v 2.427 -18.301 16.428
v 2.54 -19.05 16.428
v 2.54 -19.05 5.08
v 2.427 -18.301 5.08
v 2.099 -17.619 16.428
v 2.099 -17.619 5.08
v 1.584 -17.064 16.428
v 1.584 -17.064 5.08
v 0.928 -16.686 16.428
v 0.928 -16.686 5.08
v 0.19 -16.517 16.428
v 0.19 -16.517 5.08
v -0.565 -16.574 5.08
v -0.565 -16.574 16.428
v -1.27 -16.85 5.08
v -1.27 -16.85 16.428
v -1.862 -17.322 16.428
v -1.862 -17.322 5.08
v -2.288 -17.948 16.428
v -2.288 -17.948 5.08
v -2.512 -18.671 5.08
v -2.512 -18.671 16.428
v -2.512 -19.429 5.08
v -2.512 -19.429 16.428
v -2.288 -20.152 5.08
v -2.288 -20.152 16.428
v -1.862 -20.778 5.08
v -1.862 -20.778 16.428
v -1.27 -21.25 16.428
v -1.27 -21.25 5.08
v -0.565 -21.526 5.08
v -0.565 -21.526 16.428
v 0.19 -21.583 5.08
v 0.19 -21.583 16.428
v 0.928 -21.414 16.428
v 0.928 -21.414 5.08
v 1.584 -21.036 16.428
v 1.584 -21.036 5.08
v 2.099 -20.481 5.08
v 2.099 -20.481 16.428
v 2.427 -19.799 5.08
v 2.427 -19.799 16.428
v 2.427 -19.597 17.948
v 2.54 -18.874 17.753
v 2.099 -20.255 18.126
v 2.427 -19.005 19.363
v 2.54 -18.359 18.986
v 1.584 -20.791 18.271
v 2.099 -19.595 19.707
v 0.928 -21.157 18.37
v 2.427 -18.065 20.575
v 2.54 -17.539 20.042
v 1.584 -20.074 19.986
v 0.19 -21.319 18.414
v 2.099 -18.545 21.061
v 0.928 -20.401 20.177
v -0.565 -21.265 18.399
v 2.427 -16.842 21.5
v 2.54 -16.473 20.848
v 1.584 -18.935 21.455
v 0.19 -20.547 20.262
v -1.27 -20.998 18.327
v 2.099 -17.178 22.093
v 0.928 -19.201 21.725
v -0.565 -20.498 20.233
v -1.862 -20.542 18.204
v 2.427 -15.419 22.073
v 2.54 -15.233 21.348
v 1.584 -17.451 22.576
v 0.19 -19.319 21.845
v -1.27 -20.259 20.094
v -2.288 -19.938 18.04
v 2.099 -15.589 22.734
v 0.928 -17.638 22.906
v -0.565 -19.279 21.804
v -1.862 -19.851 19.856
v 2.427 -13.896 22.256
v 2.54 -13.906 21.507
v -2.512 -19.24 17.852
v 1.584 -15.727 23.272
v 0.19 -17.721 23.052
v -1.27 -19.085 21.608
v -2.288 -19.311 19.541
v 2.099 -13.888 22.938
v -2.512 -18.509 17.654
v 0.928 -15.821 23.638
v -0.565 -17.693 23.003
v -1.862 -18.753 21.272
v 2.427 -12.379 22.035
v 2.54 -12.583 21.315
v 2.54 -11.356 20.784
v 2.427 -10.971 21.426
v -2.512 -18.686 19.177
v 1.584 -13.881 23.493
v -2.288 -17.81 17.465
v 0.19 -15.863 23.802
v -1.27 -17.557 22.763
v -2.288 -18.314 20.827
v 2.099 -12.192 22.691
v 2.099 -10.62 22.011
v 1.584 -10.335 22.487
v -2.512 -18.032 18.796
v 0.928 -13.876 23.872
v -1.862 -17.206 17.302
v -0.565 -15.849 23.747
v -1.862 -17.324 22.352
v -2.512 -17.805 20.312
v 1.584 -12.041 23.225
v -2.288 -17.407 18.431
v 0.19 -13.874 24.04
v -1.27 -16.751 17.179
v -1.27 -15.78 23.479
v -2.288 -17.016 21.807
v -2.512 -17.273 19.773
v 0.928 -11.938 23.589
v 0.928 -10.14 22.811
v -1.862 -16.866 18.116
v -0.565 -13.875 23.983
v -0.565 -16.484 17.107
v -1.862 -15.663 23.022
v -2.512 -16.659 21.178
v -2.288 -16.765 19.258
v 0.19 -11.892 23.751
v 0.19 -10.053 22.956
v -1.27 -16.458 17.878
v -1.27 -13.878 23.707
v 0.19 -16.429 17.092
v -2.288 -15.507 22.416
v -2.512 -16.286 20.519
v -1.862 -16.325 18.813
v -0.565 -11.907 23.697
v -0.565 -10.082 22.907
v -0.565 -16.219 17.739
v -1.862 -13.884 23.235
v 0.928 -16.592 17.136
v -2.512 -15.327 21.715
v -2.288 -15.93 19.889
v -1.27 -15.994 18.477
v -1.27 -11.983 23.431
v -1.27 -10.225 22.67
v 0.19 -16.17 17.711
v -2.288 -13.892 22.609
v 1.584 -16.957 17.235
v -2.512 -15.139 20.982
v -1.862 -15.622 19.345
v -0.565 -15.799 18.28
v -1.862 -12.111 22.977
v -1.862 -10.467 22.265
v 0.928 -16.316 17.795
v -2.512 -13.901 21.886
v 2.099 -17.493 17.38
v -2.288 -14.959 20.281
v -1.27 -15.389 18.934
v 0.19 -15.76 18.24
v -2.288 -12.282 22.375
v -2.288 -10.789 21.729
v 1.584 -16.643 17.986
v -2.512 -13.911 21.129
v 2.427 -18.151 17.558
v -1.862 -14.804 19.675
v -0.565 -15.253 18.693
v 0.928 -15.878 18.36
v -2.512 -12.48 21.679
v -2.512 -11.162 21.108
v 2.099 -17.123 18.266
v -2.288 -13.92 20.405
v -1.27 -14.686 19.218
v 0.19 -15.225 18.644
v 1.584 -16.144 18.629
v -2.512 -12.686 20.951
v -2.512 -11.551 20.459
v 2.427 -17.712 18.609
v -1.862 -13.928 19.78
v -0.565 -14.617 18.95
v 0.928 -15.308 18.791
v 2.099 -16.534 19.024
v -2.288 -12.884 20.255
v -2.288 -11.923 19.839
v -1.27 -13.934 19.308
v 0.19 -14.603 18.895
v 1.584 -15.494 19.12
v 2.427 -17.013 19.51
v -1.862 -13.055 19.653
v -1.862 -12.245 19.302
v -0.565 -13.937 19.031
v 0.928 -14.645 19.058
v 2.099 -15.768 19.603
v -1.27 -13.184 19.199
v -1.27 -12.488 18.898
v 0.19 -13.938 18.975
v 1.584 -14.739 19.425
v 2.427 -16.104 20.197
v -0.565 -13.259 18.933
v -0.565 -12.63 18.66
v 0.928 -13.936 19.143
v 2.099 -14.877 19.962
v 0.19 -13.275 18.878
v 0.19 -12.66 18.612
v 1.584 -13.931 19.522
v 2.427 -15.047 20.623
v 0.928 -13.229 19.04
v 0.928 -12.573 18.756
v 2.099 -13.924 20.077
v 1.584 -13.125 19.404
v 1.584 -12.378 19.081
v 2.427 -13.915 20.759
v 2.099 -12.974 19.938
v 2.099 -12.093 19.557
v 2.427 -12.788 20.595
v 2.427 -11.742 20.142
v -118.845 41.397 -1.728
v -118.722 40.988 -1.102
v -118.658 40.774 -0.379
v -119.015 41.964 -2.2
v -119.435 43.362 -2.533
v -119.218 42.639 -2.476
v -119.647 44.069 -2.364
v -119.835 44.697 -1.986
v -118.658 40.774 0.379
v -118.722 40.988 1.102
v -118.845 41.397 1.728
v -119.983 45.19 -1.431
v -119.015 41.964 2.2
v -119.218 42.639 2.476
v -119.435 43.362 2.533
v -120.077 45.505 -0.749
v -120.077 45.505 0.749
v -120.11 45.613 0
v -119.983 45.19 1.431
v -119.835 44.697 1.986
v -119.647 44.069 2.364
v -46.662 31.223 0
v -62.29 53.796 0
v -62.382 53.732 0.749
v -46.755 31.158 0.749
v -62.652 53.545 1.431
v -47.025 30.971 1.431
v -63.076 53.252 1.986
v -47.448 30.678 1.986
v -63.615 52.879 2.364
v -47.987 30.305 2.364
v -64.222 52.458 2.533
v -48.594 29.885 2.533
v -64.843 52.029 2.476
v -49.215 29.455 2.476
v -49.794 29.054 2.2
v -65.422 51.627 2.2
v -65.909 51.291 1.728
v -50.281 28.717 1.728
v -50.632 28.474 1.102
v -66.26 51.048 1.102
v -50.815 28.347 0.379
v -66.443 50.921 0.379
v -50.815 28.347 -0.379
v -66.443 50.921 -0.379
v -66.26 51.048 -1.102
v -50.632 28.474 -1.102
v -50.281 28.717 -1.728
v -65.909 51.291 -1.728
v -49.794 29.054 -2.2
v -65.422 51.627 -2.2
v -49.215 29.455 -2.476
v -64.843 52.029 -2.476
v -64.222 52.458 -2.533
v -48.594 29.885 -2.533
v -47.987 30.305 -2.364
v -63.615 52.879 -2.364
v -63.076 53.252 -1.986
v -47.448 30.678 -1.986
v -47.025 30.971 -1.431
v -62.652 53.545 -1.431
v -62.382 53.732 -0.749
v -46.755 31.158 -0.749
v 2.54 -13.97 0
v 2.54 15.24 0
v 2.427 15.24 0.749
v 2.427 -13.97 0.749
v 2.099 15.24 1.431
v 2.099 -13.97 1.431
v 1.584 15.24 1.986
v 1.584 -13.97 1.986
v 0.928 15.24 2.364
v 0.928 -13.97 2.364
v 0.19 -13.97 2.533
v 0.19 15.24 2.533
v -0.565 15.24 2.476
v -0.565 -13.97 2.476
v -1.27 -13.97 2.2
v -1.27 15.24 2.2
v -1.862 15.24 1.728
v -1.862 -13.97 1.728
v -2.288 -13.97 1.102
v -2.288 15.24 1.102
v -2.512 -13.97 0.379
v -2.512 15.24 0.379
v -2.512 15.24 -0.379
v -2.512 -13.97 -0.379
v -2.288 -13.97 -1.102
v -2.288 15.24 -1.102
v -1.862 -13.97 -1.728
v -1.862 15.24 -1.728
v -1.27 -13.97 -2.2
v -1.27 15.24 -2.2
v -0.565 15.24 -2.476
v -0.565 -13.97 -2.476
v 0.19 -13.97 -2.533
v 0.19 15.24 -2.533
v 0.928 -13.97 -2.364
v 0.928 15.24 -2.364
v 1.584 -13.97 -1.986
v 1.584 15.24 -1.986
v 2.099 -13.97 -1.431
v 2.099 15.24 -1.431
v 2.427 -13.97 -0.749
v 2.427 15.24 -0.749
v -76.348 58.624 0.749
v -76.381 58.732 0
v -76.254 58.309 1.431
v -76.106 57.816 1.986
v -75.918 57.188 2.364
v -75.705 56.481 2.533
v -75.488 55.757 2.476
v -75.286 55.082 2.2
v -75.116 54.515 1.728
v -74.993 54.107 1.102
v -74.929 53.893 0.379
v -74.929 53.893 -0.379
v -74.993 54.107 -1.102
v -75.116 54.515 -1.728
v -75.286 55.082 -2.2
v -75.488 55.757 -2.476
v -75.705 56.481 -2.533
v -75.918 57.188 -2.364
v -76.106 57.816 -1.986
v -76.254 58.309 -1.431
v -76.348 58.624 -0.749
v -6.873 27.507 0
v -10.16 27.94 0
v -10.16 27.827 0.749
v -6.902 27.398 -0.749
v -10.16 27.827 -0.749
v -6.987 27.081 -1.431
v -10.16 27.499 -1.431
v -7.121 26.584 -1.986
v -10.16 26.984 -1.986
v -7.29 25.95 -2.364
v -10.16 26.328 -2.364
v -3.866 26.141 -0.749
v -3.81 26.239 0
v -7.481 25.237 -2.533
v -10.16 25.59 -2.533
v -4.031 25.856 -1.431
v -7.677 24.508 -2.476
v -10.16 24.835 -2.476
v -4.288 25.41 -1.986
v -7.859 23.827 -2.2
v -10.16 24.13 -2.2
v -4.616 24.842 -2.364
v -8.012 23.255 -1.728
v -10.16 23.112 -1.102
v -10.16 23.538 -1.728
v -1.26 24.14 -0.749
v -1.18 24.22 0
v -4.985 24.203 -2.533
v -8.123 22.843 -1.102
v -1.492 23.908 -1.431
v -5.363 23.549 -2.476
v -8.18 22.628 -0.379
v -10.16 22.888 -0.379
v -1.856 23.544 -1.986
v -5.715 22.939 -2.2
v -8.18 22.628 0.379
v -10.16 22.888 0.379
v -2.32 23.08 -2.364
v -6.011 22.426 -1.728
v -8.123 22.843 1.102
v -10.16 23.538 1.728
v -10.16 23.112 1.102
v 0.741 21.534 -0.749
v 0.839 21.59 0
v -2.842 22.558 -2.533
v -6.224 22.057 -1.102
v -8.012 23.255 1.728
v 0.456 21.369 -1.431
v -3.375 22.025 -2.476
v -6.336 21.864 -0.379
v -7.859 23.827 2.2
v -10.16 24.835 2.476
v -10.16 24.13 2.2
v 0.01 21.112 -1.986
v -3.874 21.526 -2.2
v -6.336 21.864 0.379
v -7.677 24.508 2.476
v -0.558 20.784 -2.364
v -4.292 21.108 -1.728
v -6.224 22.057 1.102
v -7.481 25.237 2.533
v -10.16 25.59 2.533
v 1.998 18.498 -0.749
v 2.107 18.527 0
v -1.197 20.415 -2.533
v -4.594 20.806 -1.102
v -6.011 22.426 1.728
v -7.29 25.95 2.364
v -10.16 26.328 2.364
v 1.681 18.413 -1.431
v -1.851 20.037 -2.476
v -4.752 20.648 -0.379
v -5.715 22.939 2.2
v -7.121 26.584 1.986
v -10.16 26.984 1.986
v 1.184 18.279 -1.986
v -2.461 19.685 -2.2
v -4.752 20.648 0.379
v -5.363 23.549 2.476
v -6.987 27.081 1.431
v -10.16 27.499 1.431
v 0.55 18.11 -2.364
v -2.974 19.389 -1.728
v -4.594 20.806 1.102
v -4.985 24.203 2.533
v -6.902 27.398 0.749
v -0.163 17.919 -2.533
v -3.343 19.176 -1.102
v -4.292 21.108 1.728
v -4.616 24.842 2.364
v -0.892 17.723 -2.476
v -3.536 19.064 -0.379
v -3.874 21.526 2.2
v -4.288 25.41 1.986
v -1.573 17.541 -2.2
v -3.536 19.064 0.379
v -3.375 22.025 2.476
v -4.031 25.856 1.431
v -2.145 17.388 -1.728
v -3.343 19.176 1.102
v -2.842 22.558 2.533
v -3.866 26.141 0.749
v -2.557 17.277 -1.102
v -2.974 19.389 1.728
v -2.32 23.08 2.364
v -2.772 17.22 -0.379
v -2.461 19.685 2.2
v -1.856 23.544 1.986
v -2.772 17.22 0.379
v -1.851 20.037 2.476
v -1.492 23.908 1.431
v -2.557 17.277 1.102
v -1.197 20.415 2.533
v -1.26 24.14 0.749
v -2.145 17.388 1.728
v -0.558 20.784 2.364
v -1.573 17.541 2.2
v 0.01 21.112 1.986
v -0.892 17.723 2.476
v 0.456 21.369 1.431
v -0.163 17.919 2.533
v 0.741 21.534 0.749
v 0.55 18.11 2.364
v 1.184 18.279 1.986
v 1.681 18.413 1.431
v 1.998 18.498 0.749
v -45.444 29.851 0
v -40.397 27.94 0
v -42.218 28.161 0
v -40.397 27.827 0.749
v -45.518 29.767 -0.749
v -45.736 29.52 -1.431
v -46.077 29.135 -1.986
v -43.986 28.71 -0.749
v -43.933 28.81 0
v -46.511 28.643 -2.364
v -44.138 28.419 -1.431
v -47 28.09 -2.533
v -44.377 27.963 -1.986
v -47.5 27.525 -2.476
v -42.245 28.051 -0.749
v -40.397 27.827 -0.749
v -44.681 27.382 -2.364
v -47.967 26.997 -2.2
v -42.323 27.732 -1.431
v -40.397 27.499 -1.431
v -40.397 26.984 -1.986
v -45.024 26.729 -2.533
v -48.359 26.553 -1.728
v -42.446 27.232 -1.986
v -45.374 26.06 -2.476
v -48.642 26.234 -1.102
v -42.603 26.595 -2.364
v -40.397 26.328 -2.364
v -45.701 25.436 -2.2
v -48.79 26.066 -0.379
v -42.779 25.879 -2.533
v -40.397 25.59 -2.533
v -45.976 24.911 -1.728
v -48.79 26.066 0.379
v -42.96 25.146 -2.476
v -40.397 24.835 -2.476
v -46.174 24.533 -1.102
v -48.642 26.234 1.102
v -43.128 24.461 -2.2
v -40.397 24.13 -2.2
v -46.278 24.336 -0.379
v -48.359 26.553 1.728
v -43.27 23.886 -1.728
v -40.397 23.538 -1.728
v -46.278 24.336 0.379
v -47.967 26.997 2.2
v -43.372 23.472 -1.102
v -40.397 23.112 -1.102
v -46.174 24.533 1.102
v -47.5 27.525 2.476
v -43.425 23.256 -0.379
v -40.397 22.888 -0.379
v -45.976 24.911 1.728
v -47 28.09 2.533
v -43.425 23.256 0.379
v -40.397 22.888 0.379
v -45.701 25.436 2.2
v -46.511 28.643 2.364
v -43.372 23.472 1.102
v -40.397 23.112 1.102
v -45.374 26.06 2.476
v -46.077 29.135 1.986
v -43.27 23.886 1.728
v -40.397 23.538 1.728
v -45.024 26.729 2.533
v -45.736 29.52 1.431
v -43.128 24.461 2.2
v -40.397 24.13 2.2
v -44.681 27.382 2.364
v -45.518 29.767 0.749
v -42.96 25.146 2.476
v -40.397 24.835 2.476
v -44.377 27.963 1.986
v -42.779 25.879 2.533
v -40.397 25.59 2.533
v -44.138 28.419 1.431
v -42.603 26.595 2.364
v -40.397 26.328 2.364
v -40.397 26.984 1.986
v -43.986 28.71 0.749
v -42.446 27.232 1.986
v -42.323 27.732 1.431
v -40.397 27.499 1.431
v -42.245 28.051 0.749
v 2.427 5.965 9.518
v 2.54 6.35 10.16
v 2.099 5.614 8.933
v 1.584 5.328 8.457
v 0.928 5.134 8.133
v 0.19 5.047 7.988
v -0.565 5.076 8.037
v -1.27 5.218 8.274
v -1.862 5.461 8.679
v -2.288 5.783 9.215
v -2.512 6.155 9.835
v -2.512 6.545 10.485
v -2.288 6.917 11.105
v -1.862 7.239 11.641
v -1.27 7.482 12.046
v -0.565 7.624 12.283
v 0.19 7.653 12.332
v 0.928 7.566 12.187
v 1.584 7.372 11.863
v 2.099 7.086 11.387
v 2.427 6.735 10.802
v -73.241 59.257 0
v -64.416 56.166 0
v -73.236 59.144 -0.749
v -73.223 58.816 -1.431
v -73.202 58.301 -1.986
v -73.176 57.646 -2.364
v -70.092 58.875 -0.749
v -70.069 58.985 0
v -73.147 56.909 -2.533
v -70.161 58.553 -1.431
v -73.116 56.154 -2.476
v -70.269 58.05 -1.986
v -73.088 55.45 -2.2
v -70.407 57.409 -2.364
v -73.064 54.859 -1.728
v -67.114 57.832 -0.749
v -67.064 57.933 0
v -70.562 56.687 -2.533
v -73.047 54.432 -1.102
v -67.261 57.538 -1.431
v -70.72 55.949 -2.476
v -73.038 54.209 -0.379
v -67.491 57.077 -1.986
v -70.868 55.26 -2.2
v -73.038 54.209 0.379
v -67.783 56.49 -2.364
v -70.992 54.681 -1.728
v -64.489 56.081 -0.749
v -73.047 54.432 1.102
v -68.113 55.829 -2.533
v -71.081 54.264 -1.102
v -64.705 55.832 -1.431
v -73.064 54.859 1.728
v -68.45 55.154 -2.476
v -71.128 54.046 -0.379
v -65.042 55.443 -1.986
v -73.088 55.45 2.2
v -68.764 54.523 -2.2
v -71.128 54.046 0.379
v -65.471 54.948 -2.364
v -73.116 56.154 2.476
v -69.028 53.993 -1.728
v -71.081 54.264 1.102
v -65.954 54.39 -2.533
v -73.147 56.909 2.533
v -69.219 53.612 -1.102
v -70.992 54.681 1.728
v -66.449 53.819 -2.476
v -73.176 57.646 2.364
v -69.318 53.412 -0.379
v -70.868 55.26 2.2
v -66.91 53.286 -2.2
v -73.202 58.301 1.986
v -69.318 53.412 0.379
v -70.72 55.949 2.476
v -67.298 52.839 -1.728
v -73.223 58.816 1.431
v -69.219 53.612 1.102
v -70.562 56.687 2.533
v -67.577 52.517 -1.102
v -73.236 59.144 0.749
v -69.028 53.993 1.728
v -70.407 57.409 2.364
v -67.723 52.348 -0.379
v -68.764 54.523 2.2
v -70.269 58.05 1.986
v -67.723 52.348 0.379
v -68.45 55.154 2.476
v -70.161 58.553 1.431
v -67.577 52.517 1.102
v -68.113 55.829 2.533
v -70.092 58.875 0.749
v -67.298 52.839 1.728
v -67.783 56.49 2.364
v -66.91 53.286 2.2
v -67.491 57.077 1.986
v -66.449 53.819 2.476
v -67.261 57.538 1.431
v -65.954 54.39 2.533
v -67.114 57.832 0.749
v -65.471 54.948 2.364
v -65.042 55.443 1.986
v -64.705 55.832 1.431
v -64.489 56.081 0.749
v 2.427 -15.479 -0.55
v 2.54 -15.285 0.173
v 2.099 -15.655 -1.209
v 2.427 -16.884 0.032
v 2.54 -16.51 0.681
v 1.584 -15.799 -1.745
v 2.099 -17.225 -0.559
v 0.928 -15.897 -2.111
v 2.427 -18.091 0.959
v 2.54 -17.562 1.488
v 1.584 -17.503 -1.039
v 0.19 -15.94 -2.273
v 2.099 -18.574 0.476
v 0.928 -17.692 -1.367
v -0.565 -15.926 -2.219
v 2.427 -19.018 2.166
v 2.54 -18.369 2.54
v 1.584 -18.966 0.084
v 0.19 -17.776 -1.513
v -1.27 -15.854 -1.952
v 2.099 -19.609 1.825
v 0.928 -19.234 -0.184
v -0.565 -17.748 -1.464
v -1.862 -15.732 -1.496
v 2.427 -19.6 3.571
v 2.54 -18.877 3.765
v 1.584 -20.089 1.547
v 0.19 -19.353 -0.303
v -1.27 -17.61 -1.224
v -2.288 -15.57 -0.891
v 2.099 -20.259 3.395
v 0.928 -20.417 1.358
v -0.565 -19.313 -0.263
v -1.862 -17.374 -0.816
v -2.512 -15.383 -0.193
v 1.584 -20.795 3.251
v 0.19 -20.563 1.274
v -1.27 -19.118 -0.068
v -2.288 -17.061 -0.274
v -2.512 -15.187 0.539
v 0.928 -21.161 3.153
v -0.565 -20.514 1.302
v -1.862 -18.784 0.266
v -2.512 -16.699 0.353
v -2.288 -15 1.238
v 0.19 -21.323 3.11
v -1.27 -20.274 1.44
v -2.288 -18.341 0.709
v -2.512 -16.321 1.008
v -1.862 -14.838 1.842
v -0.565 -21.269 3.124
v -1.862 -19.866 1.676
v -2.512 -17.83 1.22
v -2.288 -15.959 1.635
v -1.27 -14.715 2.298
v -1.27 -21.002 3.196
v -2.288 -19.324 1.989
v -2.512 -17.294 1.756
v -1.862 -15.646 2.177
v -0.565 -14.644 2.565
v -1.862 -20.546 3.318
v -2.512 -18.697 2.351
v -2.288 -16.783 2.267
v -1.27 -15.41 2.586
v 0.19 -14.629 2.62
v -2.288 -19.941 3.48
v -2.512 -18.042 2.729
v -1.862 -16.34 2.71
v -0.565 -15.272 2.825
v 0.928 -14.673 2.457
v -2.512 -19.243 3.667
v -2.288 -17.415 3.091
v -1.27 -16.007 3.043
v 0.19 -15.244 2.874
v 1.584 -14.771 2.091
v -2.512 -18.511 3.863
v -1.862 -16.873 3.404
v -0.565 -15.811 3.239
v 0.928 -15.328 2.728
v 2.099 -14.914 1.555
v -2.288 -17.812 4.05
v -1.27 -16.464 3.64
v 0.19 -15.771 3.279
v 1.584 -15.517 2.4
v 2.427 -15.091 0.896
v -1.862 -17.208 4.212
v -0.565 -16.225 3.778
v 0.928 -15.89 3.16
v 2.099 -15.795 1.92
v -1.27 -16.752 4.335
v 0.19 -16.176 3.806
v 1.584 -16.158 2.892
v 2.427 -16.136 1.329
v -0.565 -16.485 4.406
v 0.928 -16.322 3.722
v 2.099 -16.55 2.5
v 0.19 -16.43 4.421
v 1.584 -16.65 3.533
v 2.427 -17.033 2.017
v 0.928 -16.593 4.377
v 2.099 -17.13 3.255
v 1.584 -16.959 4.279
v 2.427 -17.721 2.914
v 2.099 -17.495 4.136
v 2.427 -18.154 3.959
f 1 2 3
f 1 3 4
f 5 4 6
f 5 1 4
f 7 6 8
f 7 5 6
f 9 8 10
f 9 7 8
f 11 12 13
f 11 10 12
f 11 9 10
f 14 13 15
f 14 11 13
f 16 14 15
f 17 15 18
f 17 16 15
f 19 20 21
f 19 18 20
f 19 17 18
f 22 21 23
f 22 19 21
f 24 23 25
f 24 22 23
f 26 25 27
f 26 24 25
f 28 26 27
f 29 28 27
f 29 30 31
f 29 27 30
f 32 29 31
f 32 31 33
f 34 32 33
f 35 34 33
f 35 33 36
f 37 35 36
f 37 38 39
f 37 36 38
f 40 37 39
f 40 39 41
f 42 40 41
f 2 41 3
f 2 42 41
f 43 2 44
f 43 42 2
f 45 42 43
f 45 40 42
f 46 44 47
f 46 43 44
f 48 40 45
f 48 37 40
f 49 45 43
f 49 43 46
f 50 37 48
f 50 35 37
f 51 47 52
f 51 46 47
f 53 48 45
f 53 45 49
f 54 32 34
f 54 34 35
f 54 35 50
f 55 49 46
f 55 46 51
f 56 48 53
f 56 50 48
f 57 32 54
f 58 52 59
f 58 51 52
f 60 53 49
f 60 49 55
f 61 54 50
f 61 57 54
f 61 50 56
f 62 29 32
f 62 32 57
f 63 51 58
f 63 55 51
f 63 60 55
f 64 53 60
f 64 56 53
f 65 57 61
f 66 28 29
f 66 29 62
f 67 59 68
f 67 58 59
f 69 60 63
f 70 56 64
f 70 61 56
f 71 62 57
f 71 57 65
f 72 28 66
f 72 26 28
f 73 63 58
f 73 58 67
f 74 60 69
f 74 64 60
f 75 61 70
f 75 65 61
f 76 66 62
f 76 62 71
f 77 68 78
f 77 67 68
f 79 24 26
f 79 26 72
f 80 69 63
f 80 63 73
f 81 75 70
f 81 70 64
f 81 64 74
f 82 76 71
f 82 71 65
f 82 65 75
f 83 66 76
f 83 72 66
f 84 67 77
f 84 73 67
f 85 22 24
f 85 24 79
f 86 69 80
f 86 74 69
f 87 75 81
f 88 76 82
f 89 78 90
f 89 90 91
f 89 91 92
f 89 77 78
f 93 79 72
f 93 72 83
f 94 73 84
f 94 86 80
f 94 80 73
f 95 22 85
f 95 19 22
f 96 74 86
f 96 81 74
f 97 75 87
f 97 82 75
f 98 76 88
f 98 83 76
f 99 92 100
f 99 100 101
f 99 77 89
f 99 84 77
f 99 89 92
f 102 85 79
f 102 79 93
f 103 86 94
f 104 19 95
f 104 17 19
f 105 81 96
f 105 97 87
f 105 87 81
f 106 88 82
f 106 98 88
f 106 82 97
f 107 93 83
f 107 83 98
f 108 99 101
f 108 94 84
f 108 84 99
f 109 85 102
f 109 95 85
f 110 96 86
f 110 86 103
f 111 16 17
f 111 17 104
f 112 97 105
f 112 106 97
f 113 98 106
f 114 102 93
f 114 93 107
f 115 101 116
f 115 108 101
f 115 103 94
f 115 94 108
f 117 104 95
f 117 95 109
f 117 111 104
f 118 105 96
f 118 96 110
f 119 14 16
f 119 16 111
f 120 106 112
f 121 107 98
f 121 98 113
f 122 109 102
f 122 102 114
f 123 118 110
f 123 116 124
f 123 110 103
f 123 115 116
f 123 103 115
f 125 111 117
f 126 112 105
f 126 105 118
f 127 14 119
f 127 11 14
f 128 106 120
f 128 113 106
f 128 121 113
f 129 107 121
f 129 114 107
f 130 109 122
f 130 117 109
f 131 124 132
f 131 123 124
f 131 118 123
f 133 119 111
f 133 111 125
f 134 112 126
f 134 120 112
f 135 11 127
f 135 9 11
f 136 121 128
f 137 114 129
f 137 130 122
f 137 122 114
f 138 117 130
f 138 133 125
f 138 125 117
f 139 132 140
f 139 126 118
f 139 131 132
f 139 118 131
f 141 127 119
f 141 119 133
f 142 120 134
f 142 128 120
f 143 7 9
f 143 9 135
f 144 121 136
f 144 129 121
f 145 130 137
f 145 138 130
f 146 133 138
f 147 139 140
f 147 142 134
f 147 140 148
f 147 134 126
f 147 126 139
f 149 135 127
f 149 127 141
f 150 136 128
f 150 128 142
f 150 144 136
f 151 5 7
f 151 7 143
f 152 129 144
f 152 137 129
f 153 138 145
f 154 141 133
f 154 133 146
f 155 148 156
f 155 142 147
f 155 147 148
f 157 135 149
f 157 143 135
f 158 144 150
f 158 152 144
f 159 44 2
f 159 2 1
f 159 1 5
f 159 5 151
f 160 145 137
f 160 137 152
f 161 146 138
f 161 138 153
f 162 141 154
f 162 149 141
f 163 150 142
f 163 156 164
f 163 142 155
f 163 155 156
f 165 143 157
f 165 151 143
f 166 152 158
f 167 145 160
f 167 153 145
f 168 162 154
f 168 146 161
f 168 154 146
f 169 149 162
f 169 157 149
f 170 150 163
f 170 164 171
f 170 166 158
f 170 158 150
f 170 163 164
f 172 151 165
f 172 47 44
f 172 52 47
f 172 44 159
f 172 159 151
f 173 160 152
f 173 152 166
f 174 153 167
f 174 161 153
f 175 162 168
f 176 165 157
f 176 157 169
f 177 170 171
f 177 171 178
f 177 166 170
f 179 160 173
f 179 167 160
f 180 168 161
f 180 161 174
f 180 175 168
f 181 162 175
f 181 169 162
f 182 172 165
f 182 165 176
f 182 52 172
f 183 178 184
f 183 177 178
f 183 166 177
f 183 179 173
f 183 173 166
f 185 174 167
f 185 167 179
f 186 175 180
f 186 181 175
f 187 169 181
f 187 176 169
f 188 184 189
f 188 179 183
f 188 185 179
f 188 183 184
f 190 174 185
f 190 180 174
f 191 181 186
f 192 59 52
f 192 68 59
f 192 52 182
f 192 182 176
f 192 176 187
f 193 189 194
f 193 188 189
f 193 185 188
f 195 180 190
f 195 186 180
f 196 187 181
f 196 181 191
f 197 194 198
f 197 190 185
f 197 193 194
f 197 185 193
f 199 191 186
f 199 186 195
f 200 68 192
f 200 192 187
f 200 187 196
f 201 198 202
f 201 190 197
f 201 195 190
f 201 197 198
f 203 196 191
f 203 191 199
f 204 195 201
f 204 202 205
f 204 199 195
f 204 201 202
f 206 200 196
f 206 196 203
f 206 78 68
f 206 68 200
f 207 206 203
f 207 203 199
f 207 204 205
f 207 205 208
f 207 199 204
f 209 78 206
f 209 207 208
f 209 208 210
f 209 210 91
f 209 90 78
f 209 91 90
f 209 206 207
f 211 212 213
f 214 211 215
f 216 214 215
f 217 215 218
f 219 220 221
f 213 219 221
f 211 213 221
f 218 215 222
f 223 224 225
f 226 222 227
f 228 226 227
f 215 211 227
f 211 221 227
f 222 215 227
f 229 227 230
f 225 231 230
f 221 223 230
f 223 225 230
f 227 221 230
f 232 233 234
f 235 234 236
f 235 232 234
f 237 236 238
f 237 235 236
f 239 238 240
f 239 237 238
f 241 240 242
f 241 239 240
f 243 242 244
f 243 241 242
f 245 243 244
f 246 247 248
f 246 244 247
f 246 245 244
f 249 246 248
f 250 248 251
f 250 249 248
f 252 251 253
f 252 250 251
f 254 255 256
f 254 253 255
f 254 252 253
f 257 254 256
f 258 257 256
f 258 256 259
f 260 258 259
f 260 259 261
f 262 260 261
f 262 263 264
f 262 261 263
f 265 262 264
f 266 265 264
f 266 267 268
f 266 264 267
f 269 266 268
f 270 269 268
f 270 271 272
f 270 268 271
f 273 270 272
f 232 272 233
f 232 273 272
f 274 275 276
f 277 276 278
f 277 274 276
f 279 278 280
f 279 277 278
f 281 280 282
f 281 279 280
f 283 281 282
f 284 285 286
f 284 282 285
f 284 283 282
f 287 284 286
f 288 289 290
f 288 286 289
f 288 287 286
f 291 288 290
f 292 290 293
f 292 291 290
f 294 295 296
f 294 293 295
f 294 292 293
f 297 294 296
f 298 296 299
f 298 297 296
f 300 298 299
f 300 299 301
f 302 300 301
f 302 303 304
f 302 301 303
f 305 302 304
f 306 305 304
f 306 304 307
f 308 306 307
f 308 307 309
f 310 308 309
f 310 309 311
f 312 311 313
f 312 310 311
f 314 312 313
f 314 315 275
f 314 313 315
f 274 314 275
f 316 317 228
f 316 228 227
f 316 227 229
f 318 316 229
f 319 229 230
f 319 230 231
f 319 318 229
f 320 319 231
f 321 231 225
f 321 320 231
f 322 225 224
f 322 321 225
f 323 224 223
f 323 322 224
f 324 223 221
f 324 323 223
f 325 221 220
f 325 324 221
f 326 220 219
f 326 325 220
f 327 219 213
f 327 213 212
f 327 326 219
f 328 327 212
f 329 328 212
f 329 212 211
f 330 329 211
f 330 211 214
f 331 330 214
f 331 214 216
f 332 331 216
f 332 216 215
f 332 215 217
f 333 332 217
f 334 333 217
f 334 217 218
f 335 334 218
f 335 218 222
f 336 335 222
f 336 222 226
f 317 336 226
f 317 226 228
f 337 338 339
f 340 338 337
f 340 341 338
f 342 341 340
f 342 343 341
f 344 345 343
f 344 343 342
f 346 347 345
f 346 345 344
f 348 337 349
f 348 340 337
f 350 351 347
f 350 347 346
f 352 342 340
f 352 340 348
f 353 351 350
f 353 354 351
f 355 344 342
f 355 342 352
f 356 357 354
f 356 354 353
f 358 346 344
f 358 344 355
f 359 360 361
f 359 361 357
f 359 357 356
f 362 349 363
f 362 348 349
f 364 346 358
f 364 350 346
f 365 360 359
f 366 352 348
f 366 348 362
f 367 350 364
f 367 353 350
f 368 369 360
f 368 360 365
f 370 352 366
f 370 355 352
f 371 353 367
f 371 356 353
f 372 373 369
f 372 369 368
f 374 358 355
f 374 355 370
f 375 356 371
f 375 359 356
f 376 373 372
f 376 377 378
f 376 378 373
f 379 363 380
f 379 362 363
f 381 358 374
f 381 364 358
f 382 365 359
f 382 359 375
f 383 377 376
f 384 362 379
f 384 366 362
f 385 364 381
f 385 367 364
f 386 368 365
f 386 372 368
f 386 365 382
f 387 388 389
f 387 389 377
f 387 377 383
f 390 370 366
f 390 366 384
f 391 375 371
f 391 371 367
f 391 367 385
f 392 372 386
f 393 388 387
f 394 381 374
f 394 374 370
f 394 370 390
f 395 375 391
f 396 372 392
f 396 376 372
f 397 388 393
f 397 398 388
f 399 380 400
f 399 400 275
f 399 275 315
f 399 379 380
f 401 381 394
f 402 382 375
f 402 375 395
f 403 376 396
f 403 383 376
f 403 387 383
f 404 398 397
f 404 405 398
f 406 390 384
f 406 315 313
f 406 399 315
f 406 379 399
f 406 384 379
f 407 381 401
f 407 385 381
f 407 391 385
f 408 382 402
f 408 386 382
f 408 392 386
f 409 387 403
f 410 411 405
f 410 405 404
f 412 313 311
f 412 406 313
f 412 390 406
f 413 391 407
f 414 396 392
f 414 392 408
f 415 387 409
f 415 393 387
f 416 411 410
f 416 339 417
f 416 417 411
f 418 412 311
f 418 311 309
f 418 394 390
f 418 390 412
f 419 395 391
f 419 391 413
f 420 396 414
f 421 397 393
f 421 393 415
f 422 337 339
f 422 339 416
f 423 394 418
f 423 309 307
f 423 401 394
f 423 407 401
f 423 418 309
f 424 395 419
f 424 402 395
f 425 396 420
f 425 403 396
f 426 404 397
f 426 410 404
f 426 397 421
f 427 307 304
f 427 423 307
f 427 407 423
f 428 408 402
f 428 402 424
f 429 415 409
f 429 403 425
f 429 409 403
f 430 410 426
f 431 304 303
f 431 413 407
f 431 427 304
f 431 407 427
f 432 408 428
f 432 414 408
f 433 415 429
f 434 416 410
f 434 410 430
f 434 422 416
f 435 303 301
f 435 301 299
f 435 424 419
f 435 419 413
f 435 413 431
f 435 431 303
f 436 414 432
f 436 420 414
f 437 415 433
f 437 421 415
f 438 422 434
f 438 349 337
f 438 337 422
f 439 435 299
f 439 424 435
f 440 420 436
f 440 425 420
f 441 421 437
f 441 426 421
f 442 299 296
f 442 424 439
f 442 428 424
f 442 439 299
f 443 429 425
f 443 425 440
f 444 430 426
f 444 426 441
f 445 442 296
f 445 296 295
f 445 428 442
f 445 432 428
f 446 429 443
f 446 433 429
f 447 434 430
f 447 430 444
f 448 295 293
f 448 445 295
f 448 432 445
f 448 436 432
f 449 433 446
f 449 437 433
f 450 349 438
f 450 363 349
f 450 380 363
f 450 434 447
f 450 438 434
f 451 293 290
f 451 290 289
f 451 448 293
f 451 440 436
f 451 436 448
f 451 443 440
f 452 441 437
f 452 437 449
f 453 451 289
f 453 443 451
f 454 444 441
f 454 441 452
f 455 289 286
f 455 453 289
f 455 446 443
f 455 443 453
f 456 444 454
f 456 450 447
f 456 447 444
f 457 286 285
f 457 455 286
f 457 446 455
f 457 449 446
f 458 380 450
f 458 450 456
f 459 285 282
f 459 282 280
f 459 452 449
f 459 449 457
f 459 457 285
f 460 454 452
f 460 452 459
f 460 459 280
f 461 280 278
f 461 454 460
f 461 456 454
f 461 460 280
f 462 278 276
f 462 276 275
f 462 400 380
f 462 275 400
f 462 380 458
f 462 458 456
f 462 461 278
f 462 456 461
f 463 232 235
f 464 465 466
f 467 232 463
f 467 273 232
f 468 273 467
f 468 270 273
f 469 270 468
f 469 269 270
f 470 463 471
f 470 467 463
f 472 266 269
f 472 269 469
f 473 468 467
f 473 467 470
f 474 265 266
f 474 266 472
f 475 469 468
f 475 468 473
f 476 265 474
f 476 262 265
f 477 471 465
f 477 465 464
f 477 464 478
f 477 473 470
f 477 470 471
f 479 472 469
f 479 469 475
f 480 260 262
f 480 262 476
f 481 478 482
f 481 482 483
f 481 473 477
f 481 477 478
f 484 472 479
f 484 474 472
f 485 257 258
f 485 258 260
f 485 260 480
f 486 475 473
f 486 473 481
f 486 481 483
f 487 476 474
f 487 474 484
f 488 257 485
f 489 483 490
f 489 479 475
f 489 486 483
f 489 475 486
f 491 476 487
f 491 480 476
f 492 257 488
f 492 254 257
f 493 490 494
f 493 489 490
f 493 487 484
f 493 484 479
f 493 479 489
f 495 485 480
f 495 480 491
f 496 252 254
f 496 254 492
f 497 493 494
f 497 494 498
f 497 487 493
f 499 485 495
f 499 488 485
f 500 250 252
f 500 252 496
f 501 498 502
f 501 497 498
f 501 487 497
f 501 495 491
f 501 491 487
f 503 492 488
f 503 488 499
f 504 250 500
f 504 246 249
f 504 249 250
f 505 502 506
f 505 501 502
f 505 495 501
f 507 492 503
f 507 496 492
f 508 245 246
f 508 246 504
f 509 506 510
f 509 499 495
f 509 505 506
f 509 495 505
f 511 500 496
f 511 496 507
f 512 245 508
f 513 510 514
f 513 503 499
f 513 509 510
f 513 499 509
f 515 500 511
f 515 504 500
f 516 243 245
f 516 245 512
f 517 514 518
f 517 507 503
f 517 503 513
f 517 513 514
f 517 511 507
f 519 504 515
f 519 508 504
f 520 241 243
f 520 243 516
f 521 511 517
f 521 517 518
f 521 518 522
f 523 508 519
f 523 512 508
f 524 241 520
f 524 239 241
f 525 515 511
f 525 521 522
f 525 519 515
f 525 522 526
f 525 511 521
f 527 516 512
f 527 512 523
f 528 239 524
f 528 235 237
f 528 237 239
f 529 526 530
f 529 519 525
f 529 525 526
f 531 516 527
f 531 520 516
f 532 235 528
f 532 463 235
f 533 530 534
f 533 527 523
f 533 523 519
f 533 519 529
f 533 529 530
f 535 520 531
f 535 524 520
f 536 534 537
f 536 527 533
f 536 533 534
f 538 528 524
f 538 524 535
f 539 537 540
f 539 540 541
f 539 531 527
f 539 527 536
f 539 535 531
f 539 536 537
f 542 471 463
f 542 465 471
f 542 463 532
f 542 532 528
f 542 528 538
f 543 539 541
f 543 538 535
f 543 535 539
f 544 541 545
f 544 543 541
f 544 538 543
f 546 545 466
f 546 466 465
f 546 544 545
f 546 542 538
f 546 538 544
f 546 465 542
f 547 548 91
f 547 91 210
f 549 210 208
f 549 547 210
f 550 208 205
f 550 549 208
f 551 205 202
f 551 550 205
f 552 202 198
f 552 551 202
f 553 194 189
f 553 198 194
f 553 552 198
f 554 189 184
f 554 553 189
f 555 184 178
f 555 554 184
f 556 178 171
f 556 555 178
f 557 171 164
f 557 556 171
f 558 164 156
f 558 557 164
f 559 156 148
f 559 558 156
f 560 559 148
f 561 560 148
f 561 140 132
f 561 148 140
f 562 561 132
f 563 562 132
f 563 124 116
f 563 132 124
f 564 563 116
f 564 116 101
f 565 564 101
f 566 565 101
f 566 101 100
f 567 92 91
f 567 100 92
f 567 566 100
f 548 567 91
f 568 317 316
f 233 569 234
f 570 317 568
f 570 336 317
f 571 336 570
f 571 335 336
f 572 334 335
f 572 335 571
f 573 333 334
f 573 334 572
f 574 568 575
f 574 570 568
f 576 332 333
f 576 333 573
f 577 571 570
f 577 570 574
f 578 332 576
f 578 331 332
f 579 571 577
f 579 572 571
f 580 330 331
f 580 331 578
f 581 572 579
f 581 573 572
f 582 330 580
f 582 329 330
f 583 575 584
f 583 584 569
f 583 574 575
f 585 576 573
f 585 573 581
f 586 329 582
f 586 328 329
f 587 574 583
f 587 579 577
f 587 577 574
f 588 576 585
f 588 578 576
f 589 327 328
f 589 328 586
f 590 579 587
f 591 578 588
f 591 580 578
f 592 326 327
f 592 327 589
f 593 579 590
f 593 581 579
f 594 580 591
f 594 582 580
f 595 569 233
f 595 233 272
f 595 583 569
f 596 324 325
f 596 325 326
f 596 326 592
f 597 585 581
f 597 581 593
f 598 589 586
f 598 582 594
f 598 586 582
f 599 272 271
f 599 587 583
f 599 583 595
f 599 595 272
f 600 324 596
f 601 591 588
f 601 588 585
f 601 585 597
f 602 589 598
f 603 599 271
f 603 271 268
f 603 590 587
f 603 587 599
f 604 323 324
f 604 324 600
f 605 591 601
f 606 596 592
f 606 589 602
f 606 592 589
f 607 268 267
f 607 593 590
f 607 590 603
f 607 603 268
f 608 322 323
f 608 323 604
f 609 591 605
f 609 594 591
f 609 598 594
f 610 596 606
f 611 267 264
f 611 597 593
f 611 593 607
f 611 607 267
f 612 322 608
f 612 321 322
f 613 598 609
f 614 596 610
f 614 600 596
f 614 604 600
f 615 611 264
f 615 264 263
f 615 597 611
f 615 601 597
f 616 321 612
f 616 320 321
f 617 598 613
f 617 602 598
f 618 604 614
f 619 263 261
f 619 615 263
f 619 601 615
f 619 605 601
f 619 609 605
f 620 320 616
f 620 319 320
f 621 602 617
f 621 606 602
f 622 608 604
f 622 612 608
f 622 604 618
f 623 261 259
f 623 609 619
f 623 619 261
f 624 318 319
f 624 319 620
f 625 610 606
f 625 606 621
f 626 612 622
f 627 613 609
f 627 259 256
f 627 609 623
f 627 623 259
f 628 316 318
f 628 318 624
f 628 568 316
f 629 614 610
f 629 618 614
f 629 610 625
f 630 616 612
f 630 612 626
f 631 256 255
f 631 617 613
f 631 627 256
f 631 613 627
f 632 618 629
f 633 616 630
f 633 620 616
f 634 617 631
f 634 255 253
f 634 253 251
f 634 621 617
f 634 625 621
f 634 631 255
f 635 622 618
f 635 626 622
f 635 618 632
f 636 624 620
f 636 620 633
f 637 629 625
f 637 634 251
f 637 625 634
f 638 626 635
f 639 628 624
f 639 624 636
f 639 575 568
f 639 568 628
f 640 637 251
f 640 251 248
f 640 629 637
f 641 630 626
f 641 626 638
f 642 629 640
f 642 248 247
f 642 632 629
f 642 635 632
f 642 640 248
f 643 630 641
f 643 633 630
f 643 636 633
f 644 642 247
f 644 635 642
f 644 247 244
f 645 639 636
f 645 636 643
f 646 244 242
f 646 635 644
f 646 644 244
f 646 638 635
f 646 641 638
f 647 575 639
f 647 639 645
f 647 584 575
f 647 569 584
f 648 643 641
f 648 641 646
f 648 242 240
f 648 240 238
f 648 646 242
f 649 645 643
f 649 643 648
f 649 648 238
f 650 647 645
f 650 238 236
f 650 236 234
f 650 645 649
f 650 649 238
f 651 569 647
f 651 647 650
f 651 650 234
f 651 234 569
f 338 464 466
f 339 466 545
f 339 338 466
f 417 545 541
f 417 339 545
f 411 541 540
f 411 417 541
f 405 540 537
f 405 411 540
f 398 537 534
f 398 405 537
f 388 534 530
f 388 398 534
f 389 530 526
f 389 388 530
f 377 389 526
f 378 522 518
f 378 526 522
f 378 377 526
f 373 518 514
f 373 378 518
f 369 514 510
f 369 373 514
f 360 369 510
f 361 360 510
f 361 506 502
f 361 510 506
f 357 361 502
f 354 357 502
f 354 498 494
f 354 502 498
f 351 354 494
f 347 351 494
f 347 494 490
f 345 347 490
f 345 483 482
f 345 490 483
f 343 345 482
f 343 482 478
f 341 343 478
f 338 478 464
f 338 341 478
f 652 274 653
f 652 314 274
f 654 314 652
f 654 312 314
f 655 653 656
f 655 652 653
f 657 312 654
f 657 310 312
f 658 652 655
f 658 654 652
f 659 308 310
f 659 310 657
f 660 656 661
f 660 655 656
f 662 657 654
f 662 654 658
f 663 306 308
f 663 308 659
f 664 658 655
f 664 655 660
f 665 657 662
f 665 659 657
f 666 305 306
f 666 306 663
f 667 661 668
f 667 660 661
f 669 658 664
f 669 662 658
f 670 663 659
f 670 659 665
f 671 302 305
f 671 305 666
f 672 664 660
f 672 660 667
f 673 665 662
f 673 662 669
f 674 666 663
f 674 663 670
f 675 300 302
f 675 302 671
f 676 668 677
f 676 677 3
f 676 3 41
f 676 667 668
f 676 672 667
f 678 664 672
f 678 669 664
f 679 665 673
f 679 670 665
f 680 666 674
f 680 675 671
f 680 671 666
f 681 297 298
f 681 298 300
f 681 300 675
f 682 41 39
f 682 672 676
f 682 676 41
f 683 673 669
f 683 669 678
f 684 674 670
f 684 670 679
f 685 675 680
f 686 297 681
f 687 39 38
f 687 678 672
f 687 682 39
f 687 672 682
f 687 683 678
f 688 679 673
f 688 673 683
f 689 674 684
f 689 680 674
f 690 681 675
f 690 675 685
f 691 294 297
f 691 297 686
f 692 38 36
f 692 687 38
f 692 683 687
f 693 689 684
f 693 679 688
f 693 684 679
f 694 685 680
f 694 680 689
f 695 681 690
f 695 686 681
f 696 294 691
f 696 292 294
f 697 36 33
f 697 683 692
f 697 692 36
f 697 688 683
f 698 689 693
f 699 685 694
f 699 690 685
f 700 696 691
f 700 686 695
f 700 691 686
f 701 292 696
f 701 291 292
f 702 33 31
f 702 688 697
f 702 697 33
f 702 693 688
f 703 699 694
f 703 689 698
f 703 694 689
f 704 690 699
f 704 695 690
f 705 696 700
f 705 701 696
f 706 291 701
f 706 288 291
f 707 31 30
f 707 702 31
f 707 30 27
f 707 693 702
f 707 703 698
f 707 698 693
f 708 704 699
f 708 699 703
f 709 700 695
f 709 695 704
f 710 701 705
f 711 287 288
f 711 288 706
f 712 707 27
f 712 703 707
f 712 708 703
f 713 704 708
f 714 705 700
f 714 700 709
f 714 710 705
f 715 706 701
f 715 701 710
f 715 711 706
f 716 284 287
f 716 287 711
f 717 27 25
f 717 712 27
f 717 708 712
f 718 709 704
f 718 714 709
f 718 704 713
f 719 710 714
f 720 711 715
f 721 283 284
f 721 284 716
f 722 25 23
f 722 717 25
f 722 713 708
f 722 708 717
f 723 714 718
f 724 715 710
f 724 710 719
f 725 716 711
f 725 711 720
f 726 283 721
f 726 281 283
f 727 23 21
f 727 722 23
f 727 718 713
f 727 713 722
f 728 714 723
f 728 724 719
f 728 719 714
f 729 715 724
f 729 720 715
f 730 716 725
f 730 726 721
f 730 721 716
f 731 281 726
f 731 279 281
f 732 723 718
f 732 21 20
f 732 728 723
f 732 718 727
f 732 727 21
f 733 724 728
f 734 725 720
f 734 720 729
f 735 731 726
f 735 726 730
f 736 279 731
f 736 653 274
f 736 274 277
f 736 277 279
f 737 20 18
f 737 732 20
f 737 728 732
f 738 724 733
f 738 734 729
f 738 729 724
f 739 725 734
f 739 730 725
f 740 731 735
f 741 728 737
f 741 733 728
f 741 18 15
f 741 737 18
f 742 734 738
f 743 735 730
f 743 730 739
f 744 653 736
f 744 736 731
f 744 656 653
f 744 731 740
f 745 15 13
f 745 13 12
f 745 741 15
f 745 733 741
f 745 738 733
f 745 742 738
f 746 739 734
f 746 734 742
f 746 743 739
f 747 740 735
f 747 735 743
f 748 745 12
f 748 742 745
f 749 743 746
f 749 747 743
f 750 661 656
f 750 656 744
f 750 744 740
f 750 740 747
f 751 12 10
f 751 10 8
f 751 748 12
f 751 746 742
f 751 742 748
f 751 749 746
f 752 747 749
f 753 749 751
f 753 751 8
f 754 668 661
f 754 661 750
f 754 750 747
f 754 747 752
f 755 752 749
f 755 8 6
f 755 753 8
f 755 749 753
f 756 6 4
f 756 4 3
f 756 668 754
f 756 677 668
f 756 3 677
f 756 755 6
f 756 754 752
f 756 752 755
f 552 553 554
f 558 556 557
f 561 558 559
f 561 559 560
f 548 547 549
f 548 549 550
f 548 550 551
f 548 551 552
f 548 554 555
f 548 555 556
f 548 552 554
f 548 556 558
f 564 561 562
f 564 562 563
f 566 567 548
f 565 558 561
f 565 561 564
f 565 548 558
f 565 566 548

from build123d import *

# Parameters (mm, degrees)
SWEEP1_PROFILE_R = 2.54


with BuildPart() as part:
    # Sweep1: sweep along a curve in space
    with BuildLine() as sweep1_path:
        Line((-119.38, 43.18, 0), (-75.65089034, 56.298732898, 0))
        ThreePointArc((-75.65089034, 56.298732898, 0), (-69.372940802, 56.156071327, 0), (-64.377963156, 52.350391225, 0))
        Line((-64.377963156, 52.350391225, 0), (-48.750110734, 29.776826615, 0))
        ThreePointArc((-48.750110734, 29.776826615, 0), (-45.111961937, 26.560482191, 0), (-40.396638066, 25.4, 0))
        Line((-40.396638066, 25.4, 0), (-10.16, 25.4, 0))
        ThreePointArc((-10.16, 25.4, 0), (-2.975795103, 22.424204897, 0), (0, 15.24, 0))
        Line((0, 15.24, 0), (0, 0, 0))
        Line((0, 0, 0), (0, -13.97, 0))
        ThreePointArc((0, -13.97, 0), (0, -17.562102448, 1.487897552), (0, -19.05, 5.08))
        Line((0, -19.05, 5.08), (0, -19.05, 16.427752875))
        ThreePointArc((0, -19.05, 16.427752875), (0, -16.47290998, 20.848368401), (0, -11.356361562, 20.783816937))
        Line((0, -11.356361562, 20.783816937), (0, 6.35, 10.16))
    # Sweep1 profile (on start of the path) → Sweep1 (sweep)
    with BuildSketch(Plane(origin=(-119.38, 43.18, 0), x_dir=(-0.2873478855663455, 0.9578262852211514, 0), z_dir=(0.9578262852211514, 0.2873478855663455, 0))):
        Circle(SWEEP1_PROFILE_R)
    sweep(path=sweep1_path.line)


solid = part.part
